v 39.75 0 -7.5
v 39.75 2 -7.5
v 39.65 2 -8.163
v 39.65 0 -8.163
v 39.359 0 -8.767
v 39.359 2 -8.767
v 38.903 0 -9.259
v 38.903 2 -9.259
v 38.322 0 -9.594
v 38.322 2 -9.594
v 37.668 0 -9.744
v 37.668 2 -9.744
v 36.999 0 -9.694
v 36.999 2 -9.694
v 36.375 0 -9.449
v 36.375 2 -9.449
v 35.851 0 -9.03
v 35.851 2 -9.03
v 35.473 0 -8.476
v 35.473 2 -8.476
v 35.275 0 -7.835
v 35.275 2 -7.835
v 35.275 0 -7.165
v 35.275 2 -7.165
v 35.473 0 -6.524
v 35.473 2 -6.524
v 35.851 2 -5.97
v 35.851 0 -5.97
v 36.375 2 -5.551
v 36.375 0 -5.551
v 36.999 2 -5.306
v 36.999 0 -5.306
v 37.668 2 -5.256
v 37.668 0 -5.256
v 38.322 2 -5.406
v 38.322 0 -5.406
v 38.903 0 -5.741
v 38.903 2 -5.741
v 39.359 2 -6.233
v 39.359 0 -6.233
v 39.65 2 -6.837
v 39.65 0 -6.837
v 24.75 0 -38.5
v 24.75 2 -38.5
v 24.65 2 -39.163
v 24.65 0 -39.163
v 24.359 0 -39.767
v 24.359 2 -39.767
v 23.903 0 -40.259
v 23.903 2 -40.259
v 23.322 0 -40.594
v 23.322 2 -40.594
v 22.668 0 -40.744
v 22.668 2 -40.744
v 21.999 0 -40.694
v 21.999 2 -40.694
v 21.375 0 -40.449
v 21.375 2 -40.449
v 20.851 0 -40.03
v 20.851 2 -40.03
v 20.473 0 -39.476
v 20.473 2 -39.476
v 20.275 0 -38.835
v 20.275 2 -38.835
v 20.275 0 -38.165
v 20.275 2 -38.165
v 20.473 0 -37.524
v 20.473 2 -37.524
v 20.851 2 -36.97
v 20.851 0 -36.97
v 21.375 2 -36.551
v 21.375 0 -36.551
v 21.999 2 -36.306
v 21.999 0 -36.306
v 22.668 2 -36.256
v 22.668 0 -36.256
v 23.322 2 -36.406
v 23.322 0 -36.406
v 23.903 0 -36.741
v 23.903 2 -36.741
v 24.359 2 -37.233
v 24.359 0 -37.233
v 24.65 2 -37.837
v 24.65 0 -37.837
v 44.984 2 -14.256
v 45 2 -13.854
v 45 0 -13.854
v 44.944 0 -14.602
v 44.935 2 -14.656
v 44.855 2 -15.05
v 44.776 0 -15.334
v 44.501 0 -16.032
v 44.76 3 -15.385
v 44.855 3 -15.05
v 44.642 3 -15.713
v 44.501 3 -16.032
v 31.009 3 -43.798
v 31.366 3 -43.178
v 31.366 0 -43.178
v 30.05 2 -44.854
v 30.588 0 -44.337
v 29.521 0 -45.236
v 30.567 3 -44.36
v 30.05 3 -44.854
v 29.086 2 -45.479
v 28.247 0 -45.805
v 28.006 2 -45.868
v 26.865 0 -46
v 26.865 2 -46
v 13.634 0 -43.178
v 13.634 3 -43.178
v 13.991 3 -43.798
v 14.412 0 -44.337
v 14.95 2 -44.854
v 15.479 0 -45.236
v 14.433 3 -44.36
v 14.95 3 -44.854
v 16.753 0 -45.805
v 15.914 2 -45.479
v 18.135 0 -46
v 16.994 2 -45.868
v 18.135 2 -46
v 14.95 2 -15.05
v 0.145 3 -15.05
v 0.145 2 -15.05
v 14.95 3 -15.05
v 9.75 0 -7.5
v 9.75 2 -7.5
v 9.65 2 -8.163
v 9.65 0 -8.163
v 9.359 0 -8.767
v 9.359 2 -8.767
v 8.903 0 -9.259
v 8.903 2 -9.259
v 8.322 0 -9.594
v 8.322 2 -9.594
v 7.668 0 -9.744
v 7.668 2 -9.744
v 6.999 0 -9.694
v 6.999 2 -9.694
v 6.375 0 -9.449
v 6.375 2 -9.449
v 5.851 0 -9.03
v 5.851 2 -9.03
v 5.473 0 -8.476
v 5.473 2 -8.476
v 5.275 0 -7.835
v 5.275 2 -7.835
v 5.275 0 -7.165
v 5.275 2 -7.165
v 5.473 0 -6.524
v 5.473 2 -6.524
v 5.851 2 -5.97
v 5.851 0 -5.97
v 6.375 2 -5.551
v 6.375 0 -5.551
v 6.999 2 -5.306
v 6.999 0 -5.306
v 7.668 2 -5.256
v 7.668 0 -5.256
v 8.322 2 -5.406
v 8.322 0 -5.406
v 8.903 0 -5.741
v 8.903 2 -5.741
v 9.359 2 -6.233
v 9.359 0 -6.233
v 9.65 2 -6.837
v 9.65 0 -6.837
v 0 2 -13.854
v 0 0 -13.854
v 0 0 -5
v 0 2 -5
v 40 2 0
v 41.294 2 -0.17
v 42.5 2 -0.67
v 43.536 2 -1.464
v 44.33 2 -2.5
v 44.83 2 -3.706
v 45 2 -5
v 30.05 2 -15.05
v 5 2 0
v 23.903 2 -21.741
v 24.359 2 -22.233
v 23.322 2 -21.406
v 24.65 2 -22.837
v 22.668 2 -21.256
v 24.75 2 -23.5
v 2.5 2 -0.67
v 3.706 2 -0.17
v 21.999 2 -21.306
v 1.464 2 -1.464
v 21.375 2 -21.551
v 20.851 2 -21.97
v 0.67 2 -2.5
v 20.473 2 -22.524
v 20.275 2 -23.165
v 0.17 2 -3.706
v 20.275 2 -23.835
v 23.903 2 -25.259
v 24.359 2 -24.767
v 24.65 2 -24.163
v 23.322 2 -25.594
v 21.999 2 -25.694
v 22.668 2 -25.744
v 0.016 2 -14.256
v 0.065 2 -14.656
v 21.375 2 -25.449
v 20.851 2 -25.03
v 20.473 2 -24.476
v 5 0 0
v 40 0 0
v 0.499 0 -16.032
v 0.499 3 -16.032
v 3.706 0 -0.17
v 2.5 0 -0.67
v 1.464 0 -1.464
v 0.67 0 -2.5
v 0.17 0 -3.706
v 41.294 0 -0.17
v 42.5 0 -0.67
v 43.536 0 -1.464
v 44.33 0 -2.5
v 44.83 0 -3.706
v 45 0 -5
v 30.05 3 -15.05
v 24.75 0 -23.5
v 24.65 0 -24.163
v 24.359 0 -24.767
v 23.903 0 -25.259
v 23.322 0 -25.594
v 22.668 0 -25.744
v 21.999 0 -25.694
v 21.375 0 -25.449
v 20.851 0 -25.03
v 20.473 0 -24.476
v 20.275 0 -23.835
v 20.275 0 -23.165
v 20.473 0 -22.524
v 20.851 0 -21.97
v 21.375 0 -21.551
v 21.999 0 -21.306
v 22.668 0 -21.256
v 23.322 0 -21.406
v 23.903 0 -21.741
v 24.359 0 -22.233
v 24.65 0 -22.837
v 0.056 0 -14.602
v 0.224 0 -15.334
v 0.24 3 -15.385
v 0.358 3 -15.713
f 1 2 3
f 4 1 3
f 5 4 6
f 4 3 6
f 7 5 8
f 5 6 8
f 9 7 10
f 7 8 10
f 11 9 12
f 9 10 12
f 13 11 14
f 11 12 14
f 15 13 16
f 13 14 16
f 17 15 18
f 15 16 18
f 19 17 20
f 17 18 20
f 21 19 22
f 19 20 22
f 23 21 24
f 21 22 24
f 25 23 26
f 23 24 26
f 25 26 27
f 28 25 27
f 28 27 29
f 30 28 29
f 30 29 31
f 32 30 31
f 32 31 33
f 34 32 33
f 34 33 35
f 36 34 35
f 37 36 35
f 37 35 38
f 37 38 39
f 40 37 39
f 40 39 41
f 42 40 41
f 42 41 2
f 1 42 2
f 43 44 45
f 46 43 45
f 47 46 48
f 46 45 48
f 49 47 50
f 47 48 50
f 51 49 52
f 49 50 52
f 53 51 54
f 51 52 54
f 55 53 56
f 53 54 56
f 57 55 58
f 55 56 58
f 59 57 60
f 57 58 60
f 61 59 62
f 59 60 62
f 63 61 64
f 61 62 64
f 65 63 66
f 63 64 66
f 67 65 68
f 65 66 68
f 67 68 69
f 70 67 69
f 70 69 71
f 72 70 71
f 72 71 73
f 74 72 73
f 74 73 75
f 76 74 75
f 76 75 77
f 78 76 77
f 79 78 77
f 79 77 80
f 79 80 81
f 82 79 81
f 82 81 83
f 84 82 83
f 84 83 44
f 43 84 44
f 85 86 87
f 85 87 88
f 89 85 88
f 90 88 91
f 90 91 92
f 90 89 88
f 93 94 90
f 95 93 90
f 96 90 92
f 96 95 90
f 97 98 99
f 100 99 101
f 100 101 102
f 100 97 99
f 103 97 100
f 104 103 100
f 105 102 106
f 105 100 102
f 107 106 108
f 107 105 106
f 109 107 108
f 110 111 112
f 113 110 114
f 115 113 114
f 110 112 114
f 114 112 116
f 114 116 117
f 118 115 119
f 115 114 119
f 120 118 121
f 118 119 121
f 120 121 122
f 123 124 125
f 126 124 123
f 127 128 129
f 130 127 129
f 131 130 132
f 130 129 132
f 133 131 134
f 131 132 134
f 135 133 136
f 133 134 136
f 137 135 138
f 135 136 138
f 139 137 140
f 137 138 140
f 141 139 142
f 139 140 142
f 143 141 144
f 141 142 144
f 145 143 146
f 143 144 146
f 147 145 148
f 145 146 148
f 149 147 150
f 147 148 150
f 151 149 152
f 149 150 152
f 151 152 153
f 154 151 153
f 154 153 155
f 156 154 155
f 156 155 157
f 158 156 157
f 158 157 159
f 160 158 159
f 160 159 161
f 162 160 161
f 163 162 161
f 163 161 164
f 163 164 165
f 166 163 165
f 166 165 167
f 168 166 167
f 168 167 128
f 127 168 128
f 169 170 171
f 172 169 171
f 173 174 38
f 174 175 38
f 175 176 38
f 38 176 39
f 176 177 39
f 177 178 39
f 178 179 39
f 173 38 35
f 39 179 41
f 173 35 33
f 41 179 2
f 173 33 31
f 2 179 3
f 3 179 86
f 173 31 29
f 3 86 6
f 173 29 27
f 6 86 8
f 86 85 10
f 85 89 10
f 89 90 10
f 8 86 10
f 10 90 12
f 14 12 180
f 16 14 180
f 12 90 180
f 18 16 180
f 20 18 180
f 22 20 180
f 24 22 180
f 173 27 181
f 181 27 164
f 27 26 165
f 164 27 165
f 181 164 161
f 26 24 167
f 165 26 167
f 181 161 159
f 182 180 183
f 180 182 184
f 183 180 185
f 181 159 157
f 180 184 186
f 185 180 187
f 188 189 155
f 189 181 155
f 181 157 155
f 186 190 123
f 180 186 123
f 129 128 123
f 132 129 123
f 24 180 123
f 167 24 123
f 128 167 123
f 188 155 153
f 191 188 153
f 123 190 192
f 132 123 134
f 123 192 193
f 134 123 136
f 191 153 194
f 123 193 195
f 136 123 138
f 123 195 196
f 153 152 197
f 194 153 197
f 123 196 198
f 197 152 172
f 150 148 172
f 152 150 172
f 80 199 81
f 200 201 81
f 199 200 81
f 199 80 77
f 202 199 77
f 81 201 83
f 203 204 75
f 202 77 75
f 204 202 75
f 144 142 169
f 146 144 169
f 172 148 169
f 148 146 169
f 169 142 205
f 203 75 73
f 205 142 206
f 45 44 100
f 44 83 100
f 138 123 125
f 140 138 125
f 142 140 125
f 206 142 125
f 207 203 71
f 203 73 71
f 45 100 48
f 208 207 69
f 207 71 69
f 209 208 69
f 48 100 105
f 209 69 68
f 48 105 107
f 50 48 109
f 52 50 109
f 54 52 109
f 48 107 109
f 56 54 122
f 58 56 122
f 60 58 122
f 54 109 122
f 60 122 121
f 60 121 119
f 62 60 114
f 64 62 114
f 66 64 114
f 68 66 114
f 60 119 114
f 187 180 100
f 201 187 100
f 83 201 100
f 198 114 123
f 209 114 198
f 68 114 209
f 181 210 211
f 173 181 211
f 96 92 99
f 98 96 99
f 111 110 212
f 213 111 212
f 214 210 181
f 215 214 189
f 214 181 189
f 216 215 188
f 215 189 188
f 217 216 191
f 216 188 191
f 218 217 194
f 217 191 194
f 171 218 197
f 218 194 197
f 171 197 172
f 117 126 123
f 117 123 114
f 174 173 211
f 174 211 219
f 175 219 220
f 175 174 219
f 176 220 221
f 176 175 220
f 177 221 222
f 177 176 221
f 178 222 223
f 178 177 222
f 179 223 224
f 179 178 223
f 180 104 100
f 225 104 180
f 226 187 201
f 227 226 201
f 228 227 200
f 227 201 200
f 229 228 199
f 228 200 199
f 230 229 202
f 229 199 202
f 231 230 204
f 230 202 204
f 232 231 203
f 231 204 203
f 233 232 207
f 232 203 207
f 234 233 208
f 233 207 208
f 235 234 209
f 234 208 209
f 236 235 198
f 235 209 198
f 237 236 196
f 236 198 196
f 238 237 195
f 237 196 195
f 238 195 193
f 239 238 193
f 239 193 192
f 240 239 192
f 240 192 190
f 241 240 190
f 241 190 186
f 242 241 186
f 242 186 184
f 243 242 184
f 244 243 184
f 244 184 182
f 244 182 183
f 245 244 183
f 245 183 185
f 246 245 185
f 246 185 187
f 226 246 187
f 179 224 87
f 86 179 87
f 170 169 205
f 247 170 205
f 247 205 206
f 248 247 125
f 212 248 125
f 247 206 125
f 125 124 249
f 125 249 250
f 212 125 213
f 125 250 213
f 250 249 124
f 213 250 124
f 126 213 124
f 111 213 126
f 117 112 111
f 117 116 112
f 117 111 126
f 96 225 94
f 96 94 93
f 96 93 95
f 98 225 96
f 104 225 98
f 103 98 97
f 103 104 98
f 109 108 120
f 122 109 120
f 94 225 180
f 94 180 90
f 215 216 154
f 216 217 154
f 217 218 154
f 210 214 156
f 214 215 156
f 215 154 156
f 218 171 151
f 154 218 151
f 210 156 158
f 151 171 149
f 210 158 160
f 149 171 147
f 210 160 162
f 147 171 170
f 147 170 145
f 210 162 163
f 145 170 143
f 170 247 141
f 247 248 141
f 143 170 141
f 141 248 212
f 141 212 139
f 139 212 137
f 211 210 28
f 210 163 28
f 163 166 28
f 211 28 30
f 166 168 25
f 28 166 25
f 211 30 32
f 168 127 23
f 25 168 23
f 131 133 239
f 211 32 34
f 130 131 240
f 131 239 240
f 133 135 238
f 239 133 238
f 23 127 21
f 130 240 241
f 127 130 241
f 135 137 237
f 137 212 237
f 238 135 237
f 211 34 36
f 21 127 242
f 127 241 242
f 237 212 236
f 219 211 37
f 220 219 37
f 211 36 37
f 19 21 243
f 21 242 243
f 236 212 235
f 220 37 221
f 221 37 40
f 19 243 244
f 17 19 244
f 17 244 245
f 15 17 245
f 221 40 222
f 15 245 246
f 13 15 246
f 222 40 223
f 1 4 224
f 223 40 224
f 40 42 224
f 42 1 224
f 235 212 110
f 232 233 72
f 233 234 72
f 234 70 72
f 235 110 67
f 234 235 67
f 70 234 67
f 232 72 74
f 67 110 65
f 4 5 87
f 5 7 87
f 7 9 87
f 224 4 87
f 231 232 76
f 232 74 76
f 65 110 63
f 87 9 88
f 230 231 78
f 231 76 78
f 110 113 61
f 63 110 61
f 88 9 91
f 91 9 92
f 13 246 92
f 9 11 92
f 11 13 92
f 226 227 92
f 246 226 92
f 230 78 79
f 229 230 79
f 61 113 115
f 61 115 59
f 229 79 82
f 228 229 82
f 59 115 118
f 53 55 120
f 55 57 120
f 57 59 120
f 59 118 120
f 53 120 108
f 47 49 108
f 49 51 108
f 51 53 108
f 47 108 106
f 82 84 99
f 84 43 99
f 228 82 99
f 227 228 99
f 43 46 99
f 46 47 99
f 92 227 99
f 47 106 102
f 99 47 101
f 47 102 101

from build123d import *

# Parameters (mm, degrees)
EXTRUDE_1_DEPTH     = 3
SKETCH_2_R          = 2.25
CUT_EXTRUDE_1_DEPTH = 3
FILLET_1_R          = 5
CUT_EXTRUDE_2_DEPTH = 1


with BuildPart() as part:
    # ｽｹｯﾁ1 → ﾎﾞｽ - 押し出し1 (new body)
    with BuildSketch(Plane(origin=(0, 0, 0), x_dir=(1, 0, 0), z_dir=(0, 1, 0))):
        Polygon((0, 0), (45, 0), (45, 15), (30, 46), (15, 46), (0, 15), align=None)
    extrude(amount=EXTRUDE_1_DEPTH)

    # ｽｹｯﾁ2 → ｶｯﾄ - 押し出し1 (cut)
    with BuildSketch(Plane(origin=(0, 3, 0), x_dir=(1, 0, 0), z_dir=(0, 1, 0))):
        with Locations((7.5, 7.5)):
            Circle(SKETCH_2_R)
        with Locations((22.5, 38.5)):
            Circle(SKETCH_2_R)
        with Locations((22.5, 23.5)):
            Circle(SKETCH_2_R)
        with Locations((37.5, 7.5)):
            Circle(SKETCH_2_R)
    extrude(amount=-CUT_EXTRUDE_1_DEPTH, mode=Mode.SUBTRACT)

    # ﾌｨﾚｯﾄ1
    fillet_1_edges = [part.edges().sort_by_distance(p)[0] for p in [
        (0, 1.5, -15),
        (15, 1.5, -46),
        (30, 1.5, -46),
        (45, 1.5, -15),
        (45, 1.5, 0),
        (0, 1.5, 0),
    ]]
    fillet(fillet_1_edges, radius=FILLET_1_R)

    # ｽｹｯﾁ3 → ｶｯﾄ - 押し出し2 (cut)
    with BuildSketch(Plane(origin=(0, 3, 0), x_dir=(1, 0, 0), z_dir=(0, 1, 0))):
        Polygon((14.95, 46), (30.05, 46), (30.05, 15.05), (45, 15.05), (45, 0), (0, 0), (0, 15.05), (14.95, 15.05), align=None)
    extrude(amount=-CUT_EXTRUDE_2_DEPTH, mode=Mode.SUBTRACT)


solid = part.part
